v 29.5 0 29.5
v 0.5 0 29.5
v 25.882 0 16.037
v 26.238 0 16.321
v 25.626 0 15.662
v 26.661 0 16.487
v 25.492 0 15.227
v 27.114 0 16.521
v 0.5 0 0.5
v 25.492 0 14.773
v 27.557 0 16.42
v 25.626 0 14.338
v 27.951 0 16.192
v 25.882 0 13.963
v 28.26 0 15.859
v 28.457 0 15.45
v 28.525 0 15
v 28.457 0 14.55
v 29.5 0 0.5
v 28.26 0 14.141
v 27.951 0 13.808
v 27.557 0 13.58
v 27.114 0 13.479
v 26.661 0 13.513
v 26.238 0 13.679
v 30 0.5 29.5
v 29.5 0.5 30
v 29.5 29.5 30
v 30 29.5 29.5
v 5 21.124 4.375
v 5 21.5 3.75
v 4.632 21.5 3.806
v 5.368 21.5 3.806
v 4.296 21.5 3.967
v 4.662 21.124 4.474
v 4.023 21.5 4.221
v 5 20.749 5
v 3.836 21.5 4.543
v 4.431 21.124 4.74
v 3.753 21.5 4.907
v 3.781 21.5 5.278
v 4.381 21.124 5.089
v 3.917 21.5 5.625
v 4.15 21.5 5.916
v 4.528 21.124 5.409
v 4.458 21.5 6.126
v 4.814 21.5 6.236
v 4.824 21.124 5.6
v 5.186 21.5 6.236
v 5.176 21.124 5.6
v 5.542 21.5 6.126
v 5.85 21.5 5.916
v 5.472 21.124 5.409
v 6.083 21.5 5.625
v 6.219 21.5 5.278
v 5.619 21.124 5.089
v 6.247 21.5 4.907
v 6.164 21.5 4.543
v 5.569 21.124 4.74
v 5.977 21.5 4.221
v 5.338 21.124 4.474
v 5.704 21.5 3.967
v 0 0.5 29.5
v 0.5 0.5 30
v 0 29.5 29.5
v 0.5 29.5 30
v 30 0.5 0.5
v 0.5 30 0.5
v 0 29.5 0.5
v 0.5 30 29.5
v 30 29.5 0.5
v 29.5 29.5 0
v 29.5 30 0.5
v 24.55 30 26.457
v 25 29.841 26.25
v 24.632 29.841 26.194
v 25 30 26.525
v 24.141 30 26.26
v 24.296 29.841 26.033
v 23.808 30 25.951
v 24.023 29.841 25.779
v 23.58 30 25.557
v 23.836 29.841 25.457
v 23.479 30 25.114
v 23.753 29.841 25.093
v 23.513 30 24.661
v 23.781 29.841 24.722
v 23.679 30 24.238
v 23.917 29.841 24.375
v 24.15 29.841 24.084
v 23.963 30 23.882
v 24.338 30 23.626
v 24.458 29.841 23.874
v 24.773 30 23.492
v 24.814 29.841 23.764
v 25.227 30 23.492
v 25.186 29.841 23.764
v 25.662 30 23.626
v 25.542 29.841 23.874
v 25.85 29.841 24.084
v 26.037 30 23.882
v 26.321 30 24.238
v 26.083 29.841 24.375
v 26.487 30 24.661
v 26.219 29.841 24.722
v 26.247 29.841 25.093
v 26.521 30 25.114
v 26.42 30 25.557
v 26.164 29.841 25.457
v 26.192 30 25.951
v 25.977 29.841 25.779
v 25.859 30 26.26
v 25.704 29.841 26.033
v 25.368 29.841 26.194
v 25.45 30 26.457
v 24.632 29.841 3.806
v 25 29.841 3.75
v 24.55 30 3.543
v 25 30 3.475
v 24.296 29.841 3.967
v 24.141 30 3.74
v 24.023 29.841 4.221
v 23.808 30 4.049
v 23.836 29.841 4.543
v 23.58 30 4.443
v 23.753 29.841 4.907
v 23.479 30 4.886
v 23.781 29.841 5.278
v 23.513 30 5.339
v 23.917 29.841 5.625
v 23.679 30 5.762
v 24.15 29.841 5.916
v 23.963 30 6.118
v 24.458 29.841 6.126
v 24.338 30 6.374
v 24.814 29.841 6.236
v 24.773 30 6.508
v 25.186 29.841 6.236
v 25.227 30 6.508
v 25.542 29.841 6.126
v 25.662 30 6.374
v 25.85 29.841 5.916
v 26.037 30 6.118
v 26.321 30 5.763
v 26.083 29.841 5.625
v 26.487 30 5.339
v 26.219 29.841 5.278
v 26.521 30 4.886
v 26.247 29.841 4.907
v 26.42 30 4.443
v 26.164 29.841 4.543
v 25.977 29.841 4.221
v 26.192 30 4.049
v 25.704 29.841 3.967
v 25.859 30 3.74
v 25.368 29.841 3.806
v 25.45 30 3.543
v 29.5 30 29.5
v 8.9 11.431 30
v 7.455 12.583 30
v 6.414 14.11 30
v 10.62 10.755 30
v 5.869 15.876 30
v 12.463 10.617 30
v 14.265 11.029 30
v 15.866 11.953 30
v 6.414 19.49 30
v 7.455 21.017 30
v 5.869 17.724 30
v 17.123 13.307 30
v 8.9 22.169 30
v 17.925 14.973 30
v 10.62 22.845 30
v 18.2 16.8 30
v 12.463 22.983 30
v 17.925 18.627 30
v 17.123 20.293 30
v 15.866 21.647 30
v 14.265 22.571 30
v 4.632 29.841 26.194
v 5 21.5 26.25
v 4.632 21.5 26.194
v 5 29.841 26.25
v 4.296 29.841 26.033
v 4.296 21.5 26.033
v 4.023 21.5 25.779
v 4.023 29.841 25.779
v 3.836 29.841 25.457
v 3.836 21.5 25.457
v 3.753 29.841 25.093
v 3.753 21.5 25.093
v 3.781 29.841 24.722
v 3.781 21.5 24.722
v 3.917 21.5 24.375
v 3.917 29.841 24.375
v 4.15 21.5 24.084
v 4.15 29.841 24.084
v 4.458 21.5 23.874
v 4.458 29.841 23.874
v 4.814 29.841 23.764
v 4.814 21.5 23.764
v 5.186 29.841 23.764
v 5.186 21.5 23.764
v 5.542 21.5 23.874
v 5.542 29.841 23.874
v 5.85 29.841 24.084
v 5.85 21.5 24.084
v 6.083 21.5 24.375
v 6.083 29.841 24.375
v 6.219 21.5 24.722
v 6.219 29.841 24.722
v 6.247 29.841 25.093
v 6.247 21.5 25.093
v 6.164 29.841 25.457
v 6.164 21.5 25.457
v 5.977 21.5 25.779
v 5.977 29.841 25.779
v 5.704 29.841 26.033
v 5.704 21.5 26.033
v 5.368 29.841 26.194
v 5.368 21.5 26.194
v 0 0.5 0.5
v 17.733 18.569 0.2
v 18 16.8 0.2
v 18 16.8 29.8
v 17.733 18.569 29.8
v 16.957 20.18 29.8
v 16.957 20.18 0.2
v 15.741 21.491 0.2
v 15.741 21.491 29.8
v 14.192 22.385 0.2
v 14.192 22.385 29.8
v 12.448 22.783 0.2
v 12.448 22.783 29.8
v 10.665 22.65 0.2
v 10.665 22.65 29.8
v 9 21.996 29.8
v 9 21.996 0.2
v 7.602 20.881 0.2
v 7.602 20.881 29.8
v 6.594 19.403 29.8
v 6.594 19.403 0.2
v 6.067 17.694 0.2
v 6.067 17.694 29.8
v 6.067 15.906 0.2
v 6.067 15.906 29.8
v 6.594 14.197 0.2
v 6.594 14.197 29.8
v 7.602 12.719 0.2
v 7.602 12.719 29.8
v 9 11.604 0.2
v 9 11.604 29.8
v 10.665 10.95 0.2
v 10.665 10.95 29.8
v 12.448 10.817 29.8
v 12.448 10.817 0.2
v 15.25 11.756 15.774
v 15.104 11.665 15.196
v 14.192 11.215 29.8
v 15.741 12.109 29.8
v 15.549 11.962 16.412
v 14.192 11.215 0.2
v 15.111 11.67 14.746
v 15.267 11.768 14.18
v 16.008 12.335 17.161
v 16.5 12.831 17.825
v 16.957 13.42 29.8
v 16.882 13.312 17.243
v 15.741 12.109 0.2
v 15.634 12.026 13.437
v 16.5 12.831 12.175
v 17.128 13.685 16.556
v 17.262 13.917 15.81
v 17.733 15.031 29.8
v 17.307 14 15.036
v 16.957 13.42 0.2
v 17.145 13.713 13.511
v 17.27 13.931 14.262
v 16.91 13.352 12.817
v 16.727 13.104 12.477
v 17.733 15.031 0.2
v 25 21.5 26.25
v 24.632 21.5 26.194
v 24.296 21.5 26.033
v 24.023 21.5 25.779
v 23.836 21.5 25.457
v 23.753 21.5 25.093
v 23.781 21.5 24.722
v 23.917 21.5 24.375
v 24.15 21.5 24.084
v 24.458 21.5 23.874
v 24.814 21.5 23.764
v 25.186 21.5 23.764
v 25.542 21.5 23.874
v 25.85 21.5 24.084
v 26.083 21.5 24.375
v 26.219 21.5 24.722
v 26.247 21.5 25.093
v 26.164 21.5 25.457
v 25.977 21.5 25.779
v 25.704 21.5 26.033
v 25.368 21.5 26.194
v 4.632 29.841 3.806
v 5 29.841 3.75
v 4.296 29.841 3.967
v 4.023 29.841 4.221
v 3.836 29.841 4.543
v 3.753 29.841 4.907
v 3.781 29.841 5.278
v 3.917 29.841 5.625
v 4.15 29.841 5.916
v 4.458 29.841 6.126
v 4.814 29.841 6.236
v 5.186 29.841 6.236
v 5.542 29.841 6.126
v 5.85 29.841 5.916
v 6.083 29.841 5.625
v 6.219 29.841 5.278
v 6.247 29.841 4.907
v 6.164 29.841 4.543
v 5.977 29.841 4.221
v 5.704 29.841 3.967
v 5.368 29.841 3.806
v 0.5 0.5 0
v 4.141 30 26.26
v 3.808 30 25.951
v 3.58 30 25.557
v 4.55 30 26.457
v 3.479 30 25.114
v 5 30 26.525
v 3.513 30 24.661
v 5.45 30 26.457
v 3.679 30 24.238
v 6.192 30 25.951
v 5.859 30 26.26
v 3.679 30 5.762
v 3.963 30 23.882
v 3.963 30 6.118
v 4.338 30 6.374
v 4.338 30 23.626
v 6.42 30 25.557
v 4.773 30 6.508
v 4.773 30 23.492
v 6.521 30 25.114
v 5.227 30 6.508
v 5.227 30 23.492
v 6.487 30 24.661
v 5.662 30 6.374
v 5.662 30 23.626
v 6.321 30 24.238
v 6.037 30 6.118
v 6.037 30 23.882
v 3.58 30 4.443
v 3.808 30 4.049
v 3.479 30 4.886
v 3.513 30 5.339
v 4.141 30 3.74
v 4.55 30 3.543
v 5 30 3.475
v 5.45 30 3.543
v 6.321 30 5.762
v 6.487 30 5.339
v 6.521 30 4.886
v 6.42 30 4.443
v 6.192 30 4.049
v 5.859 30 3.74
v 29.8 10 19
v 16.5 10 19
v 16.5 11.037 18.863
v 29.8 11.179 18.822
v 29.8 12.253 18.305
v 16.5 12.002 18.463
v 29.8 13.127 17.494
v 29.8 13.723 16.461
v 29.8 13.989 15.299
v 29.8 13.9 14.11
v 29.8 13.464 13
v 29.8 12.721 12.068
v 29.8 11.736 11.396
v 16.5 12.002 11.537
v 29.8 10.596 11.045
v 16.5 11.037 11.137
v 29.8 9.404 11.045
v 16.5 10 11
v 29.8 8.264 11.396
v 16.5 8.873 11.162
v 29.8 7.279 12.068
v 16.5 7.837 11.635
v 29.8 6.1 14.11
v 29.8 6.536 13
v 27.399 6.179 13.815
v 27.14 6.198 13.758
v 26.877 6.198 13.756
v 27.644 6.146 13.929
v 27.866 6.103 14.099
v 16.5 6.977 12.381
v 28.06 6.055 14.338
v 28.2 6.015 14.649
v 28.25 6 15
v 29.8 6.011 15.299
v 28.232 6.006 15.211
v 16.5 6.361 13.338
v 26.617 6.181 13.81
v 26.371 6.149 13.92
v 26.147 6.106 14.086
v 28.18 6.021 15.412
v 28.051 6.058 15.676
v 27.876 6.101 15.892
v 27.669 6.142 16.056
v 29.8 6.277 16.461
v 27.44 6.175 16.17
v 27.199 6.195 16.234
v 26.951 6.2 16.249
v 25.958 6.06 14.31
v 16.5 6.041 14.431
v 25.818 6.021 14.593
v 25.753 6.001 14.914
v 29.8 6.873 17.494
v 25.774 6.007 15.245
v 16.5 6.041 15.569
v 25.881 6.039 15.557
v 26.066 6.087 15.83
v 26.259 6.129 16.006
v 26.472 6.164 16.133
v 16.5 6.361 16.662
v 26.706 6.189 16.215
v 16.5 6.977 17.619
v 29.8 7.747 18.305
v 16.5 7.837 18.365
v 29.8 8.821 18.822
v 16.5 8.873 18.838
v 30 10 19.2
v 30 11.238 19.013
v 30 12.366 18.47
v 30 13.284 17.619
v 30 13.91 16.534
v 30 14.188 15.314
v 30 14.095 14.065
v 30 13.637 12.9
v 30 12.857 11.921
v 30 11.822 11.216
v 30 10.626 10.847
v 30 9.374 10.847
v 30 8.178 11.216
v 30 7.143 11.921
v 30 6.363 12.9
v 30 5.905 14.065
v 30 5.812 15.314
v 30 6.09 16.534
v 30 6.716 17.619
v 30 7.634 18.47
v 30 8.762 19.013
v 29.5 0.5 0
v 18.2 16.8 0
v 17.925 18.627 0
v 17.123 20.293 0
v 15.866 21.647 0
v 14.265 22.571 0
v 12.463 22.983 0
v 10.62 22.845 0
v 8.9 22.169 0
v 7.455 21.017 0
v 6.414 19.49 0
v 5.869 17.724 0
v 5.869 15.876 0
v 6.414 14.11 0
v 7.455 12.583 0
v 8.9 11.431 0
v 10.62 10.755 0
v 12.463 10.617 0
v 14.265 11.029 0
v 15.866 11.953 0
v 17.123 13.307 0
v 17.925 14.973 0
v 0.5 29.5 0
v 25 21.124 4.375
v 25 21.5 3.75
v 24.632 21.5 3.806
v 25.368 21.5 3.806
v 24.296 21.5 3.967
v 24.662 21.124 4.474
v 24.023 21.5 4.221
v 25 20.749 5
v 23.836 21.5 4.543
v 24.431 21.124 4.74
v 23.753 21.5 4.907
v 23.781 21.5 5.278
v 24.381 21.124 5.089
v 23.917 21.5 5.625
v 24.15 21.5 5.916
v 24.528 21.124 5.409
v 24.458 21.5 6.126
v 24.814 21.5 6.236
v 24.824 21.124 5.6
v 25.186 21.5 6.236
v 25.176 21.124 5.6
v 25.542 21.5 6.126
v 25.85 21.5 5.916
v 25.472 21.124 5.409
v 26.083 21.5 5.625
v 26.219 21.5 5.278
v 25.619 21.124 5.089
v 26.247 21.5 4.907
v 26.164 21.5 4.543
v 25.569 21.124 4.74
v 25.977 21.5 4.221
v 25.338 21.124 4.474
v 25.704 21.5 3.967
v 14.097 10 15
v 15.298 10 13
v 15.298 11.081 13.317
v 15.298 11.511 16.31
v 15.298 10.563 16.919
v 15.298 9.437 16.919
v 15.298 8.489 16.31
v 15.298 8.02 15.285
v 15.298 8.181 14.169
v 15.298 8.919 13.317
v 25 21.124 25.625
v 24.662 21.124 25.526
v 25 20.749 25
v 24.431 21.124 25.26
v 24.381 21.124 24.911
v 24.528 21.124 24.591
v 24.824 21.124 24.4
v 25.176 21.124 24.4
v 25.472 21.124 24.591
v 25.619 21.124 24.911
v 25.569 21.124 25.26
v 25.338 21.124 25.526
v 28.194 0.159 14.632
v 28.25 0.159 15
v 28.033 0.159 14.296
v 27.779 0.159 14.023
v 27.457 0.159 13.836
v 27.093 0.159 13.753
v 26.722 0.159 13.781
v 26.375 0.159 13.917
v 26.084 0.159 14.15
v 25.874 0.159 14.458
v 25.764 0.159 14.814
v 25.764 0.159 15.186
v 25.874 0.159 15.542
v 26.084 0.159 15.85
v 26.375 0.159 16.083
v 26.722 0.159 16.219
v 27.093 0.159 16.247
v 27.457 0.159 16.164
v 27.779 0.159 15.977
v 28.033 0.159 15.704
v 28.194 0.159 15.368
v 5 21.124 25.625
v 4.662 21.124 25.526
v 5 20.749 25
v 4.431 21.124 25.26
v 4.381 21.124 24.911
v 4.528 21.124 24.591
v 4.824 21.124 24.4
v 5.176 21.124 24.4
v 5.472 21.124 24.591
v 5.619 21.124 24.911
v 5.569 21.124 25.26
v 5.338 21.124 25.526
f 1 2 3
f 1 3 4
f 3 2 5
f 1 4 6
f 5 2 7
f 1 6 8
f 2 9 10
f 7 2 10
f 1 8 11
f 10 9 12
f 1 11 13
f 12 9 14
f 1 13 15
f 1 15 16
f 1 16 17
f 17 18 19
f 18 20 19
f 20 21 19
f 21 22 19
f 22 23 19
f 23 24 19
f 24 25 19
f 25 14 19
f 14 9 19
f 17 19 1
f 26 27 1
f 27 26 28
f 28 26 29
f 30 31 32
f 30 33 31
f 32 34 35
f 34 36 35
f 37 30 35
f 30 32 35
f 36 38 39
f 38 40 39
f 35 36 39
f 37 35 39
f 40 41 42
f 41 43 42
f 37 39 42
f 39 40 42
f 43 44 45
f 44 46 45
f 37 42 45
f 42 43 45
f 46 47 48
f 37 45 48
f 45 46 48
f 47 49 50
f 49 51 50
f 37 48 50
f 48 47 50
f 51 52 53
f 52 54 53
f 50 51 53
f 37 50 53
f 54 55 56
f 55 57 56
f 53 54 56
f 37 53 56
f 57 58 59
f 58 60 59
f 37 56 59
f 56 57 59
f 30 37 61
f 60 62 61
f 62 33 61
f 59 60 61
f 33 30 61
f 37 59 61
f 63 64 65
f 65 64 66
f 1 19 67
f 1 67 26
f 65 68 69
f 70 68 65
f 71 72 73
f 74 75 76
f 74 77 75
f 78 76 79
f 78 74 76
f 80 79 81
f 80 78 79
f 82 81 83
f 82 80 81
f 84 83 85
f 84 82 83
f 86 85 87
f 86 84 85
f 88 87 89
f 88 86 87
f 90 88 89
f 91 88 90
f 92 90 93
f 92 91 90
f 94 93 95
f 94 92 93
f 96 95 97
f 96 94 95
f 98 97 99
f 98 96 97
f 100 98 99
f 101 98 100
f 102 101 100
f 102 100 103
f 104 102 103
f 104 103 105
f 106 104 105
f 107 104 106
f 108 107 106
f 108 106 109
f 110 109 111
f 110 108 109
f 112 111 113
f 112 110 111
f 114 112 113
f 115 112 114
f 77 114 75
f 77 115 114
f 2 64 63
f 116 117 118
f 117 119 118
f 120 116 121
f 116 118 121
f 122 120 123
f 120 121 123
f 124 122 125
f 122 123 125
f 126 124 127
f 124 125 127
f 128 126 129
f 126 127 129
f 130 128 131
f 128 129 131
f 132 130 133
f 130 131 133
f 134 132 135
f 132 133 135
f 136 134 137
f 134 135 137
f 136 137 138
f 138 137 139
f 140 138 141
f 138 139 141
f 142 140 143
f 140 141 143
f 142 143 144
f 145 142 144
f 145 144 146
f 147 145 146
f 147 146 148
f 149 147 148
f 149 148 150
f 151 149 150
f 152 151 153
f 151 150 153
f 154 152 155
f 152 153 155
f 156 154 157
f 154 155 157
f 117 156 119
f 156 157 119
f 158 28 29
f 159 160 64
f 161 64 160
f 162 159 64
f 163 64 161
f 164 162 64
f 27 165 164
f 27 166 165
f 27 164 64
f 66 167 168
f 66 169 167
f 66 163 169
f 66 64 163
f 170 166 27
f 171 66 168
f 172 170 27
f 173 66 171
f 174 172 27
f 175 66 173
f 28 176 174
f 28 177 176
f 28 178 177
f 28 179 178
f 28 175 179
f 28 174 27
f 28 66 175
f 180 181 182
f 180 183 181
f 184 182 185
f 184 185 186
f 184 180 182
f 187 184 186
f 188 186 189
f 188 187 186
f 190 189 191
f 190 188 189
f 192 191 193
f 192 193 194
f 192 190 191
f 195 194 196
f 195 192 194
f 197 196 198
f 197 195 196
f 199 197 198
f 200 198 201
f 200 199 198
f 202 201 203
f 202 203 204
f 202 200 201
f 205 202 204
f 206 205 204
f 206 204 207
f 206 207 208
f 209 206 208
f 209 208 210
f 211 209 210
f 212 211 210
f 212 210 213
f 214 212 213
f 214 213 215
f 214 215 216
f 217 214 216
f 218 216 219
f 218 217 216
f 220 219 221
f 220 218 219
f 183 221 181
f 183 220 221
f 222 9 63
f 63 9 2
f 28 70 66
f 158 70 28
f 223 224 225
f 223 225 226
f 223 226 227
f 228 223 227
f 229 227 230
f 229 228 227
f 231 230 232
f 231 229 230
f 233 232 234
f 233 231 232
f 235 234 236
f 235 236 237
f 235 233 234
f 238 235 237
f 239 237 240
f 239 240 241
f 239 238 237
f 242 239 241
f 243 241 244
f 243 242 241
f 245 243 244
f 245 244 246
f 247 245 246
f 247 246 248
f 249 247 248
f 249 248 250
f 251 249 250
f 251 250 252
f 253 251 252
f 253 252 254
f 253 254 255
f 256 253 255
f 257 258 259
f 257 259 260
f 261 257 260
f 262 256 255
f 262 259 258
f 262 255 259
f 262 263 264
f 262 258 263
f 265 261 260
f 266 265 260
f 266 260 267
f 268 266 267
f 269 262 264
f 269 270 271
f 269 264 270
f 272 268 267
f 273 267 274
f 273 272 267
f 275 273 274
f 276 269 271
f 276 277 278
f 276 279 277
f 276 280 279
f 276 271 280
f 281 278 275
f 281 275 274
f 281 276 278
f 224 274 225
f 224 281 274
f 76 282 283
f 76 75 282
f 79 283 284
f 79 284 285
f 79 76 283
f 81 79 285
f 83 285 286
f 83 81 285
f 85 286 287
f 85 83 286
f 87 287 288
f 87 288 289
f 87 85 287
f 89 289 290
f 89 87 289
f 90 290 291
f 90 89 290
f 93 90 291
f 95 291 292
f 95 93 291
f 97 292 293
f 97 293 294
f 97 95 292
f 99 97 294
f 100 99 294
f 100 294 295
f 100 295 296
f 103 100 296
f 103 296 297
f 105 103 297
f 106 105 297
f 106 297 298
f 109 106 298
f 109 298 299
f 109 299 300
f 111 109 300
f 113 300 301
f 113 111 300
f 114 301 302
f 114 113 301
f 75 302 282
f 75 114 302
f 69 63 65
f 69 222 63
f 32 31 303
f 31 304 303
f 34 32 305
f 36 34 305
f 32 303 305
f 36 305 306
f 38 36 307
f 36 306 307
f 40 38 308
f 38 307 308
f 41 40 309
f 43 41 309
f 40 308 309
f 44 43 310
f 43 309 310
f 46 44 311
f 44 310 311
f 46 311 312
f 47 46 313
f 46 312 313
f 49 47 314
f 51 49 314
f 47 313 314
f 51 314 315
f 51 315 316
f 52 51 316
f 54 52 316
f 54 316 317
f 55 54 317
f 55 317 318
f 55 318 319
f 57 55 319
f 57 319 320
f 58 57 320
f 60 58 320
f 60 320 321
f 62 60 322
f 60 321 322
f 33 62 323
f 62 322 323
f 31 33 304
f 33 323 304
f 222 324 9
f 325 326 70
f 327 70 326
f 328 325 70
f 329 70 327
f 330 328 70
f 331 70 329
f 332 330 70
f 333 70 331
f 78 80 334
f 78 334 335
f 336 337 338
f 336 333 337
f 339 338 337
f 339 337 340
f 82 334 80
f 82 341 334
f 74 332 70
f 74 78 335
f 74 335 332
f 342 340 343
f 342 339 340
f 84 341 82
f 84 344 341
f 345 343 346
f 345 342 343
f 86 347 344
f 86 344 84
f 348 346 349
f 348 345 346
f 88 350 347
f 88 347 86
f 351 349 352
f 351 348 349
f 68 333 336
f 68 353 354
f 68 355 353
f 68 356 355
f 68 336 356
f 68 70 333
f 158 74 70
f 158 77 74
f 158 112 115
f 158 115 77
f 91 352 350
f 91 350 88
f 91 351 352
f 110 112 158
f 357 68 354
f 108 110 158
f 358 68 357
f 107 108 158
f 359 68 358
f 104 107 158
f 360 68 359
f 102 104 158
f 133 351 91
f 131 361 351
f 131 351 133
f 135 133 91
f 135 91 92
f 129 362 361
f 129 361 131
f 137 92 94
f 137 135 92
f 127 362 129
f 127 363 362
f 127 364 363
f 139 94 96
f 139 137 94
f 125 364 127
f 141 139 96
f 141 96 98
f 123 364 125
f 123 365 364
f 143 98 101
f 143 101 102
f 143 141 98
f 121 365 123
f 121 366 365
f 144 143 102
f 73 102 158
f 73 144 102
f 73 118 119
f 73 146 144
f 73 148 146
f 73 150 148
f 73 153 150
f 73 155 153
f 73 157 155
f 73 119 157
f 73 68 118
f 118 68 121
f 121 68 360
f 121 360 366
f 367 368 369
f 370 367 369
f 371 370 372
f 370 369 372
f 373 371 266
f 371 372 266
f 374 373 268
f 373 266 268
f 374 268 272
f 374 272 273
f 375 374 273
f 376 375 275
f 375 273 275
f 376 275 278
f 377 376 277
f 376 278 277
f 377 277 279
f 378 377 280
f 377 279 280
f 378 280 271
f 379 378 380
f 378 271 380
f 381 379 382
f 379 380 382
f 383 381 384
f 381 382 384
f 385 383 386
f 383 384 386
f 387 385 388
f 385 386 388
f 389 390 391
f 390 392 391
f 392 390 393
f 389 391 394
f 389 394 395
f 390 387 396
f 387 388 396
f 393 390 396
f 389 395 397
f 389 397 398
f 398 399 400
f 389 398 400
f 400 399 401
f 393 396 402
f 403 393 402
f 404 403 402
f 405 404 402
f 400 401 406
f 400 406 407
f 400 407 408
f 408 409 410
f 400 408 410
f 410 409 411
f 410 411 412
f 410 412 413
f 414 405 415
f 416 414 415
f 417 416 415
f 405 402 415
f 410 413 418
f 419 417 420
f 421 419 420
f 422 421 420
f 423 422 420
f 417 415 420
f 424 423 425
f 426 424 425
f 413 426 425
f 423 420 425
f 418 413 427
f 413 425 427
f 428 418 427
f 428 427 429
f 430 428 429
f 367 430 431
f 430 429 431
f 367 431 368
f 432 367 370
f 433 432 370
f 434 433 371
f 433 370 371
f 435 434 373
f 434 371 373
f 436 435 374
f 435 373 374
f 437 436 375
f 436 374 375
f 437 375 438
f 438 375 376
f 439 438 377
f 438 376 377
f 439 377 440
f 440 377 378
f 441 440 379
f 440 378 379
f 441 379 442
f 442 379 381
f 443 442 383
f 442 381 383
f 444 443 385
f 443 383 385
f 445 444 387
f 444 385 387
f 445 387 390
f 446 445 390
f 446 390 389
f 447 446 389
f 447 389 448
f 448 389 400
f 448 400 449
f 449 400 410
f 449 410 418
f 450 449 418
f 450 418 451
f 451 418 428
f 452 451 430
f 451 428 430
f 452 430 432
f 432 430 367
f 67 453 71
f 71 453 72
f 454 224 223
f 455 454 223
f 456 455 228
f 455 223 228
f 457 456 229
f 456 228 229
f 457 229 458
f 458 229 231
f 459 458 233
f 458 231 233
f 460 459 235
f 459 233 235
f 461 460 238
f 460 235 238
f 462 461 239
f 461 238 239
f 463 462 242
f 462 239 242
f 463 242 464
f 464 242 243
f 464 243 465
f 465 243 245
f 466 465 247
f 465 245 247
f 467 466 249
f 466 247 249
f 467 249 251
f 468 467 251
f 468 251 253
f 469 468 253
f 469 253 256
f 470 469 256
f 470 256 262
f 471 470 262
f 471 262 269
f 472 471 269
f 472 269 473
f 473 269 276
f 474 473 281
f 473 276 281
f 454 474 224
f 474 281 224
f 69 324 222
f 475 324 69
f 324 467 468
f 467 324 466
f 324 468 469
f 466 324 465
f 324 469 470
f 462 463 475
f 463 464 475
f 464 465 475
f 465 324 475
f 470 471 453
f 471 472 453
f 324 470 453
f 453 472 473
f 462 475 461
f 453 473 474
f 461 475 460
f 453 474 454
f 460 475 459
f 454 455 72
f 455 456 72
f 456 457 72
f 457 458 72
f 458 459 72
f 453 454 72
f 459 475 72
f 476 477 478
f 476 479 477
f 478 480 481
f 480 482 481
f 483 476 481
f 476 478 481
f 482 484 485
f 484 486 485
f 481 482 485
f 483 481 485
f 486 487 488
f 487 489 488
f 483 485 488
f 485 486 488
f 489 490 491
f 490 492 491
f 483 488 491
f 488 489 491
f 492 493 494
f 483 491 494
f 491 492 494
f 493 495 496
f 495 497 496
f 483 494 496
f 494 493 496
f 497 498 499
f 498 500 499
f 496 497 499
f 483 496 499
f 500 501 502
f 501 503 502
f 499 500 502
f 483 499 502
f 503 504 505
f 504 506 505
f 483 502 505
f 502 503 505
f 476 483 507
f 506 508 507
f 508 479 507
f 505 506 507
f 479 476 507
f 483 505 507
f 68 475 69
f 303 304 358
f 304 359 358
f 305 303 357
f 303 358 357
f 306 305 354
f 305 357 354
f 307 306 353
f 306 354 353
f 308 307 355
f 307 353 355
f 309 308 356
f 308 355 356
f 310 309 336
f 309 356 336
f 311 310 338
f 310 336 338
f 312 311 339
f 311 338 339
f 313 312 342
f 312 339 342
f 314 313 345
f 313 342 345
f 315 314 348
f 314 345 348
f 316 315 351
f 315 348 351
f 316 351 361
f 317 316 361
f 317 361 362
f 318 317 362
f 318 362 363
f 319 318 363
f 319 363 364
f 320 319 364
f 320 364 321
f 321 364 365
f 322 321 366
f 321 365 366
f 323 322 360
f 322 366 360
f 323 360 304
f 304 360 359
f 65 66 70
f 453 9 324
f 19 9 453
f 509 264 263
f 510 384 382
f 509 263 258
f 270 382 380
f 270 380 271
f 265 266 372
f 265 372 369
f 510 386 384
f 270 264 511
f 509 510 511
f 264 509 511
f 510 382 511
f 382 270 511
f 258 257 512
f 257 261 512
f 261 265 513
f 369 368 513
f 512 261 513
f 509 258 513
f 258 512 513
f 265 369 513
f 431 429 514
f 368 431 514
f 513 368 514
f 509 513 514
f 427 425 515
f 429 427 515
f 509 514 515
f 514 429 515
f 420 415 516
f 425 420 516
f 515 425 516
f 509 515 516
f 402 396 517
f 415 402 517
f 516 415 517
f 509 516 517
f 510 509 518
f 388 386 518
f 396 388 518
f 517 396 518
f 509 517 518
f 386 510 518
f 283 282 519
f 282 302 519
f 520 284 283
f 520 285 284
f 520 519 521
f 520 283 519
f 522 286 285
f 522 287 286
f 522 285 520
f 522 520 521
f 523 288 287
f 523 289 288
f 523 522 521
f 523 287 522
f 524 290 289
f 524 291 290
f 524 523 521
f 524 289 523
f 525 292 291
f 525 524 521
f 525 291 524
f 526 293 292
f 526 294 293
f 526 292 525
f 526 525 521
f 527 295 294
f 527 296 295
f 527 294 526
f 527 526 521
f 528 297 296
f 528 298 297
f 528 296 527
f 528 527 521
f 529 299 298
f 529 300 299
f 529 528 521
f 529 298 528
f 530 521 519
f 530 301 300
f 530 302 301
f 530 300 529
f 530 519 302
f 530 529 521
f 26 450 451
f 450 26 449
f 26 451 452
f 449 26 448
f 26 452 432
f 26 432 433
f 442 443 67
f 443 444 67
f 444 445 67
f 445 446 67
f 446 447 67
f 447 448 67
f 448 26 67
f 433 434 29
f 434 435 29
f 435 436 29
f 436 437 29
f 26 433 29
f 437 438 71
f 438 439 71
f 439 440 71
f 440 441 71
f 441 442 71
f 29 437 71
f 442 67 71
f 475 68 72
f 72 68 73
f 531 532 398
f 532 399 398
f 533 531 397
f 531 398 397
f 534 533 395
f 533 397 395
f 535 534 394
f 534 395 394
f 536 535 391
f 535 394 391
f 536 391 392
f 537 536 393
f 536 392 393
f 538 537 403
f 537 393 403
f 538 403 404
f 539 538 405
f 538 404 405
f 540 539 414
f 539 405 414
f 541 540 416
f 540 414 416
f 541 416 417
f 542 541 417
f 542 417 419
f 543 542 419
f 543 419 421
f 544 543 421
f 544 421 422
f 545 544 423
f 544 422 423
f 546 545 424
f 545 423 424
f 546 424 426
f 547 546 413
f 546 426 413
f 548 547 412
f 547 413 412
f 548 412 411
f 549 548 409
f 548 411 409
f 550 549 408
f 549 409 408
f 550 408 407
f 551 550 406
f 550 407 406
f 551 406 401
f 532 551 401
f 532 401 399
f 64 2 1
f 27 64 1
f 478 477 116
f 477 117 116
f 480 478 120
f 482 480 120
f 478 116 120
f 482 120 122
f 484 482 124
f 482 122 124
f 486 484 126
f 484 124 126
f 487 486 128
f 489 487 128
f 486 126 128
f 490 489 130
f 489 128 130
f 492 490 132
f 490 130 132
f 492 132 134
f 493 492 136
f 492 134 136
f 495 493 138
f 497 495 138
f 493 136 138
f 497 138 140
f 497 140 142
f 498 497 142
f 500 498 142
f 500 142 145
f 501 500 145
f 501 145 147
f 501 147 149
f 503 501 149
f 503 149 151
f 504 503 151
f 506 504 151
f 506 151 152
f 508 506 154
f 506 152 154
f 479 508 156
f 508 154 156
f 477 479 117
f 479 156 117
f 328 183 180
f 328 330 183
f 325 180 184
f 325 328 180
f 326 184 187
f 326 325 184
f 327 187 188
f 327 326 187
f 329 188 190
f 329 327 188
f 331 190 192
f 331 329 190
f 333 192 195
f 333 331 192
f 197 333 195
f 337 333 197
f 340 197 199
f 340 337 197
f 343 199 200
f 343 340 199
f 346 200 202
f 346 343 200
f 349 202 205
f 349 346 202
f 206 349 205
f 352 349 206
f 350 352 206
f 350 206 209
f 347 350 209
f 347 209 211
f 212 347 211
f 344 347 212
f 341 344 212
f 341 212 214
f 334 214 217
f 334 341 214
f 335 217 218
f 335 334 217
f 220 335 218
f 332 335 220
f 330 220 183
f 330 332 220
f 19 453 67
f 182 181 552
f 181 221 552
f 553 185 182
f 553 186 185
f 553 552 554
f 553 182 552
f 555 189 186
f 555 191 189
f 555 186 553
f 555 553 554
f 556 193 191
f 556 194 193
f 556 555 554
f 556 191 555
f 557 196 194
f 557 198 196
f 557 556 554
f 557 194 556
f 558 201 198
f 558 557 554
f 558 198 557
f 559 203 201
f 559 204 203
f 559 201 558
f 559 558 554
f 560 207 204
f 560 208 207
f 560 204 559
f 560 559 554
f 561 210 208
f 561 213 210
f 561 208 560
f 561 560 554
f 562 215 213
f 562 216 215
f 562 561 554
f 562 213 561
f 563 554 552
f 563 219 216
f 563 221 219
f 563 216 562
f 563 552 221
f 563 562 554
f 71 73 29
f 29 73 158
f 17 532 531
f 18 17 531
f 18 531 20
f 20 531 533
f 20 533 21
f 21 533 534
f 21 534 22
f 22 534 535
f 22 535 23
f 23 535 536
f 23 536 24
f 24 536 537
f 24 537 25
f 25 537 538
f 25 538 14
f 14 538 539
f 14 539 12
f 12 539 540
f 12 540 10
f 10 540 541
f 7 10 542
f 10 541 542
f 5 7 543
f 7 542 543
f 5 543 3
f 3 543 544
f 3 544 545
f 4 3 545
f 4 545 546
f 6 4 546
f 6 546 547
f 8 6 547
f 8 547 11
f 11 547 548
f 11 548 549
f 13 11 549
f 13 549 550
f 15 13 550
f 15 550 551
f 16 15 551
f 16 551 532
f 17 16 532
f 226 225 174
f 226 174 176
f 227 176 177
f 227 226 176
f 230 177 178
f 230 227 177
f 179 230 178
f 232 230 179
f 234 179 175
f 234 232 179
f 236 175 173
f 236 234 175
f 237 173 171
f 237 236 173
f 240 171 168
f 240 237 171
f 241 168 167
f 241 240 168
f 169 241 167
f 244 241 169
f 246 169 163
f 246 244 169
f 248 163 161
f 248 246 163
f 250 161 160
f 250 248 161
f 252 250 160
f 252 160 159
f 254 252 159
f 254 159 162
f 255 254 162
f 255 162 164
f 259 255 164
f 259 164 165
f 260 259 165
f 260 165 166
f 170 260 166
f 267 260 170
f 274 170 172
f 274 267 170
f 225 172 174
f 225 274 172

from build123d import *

# Parameters (mm, degrees)
SCHIZZO1_W                      = 30
SCHIZZO1_H                      = 30
SCHIZZO1_R                      = 6
ESTRUSIONE_ESTRUSIONE1_DEPTH    = 30
F_8_0_8_DIAMETER_HOLE1_D        = 8
F_8_0_8_DIAMETER_HOLE1_DEPTH    = 13.5
F_8_0_8_DIAMETER_HOLE1_TIP      = 2.403442476
FORO_FILETTATO_M3_1_AT_2_COUNT  = 2
FORO_FILETTATO_M3_1_AT_2_PITCH  = 20
FORO_FILETTATO_M3_2_D           = 2.5
FORO_FILETTATO_M3_2_DEPTH       = 8.5
FORO_FILETTATO_M3_2_CSINK_D     = 3.05
FORO_FILETTATO_M3_2_CSINK_ANGLE = 120
FORO_FILETTATO_M3_2_TIP         = 0.751075774
CHAMFER1_SIZE                   = 0.5
CHAMFER2_SIZE                   = 0.2


with BuildPart() as part:
    # Schizzo1 → Estrusione-Estrusione1 (new body)
    with BuildSketch(Plane.XY):
        with Locations((15, 15)):
            Rectangle(SCHIZZO1_W, SCHIZZO1_H)
        with Locations((12, 16.8)):
            Circle(SCHIZZO1_R, mode=Mode.SUBTRACT)
    extrude(amount=ESTRUSIONE_ESTRUSIONE1_DEPTH)

    # Ø8.0 (8) Diameter Hole1
    with Locations(Plane(origin=(30, 0, 0), x_dir=(0, 0, -1), z_dir=(1, 0, 0))):
        with Locations((-15, 10)):
            Hole(F_8_0_8_DIAMETER_HOLE1_D / 2, depth=F_8_0_8_DIAMETER_HOLE1_DEPTH)
            with Locations((0, 0, -(F_8_0_8_DIAMETER_HOLE1_DEPTH + F_8_0_8_DIAMETER_HOLE1_TIP / 2))):  # 118° drill point
                Cone(0, F_8_0_8_DIAMETER_HOLE1_D / 2, F_8_0_8_DIAMETER_HOLE1_TIP, mode=Mode.SUBTRACT)

    # Schizzo7 → Foro filettato M3-1 (revolve, cut)
    with BuildSketch(Plane(origin=(5, 30, 25), x_dir=(0, 0, 1), z_dir=(1, 0, 0))):
        Polygon((0, 0), (0, 9.251075774), (1.25, 8.5), (1.25, 0.158771324), (1.525, 0), align=None)
    foro_filettato_m3_1 = revolve(axis=Axis((5, 36.35, 25), (0, -1, 0)), mode=Mode.SUBTRACT)

    # Foro filettato M3-1 at 2: Foro filettato M3-1 ×2
    with Locations(*[(i * FORO_FILETTATO_M3_1_AT_2_PITCH, 0, 0) for i in range(1, FORO_FILETTATO_M3_1_AT_2_COUNT)]):
        add(foro_filettato_m3_1, mode=Mode.SUBTRACT)

    # Specchia1: Foro filettato M3-1 across plane
    add(foro_filettato_m3_1.mirror(Plane.XY.offset(15)), mode=Mode.SUBTRACT)

    # Specchia1 copy 1 sketch → Specchia1 copy 1 (revolve, cut)
    with BuildSketch(Plane(origin=(25, 30, 5), x_dir=(0, 0, -1), z_dir=(1, 0, 0))):
        Polygon((0, 0), (0, -9.251075774), (1.25, -8.5), (1.25, -0.158771324), (1.525, 0), align=None)
    revolve(axis=Axis((25, 36.35, 5), (0, 1, 0)), mode=Mode.SUBTRACT)

    # Foro filettato M3-2
    with Locations(Plane(origin=(0, 0, 0), x_dir=(-1, 0, 0), z_dir=(0, -1, 0))):
        with Locations((-27, -15)):
            CounterSinkHole(FORO_FILETTATO_M3_2_D / 2, FORO_FILETTATO_M3_2_CSINK_D / 2, depth=FORO_FILETTATO_M3_2_DEPTH, counter_sink_angle=FORO_FILETTATO_M3_2_CSINK_ANGLE)
            with Locations((0, 0, -(FORO_FILETTATO_M3_2_DEPTH + FORO_FILETTATO_M3_2_TIP / 2))):  # 118° drill point
                Cone(0, FORO_FILETTATO_M3_2_D / 2, FORO_FILETTATO_M3_2_TIP, mode=Mode.SUBTRACT)

    # Chamfer1
    chamfer1_edges = [part.edges().sort_by_distance(p)[0] for p in [
        (30, 15, 30),
        (15, 30, 30),
        (0, 15, 30),
        (15, 30, 0),
        (30, 15, 0),
        (15, 0, 0),
        (0, 15, 0),
        (15, 0, 30),
        (0, 30, 15),
        (30, 30, 15),
        (30, 0, 15),
        (0, 0, 15),
    ]]
    chamfer(chamfer1_edges, length=CHAMFER1_SIZE)

    # Chamfer2
    chamfer2_edges = [part.edges().sort_by_distance(p)[0] for p in [
        (6, 16.8, 0),
        (6, 16.8, 30),
        (30, 10, 11),
    ]]
    chamfer(chamfer2_edges, length=CHAMFER2_SIZE)


solid = part.part
